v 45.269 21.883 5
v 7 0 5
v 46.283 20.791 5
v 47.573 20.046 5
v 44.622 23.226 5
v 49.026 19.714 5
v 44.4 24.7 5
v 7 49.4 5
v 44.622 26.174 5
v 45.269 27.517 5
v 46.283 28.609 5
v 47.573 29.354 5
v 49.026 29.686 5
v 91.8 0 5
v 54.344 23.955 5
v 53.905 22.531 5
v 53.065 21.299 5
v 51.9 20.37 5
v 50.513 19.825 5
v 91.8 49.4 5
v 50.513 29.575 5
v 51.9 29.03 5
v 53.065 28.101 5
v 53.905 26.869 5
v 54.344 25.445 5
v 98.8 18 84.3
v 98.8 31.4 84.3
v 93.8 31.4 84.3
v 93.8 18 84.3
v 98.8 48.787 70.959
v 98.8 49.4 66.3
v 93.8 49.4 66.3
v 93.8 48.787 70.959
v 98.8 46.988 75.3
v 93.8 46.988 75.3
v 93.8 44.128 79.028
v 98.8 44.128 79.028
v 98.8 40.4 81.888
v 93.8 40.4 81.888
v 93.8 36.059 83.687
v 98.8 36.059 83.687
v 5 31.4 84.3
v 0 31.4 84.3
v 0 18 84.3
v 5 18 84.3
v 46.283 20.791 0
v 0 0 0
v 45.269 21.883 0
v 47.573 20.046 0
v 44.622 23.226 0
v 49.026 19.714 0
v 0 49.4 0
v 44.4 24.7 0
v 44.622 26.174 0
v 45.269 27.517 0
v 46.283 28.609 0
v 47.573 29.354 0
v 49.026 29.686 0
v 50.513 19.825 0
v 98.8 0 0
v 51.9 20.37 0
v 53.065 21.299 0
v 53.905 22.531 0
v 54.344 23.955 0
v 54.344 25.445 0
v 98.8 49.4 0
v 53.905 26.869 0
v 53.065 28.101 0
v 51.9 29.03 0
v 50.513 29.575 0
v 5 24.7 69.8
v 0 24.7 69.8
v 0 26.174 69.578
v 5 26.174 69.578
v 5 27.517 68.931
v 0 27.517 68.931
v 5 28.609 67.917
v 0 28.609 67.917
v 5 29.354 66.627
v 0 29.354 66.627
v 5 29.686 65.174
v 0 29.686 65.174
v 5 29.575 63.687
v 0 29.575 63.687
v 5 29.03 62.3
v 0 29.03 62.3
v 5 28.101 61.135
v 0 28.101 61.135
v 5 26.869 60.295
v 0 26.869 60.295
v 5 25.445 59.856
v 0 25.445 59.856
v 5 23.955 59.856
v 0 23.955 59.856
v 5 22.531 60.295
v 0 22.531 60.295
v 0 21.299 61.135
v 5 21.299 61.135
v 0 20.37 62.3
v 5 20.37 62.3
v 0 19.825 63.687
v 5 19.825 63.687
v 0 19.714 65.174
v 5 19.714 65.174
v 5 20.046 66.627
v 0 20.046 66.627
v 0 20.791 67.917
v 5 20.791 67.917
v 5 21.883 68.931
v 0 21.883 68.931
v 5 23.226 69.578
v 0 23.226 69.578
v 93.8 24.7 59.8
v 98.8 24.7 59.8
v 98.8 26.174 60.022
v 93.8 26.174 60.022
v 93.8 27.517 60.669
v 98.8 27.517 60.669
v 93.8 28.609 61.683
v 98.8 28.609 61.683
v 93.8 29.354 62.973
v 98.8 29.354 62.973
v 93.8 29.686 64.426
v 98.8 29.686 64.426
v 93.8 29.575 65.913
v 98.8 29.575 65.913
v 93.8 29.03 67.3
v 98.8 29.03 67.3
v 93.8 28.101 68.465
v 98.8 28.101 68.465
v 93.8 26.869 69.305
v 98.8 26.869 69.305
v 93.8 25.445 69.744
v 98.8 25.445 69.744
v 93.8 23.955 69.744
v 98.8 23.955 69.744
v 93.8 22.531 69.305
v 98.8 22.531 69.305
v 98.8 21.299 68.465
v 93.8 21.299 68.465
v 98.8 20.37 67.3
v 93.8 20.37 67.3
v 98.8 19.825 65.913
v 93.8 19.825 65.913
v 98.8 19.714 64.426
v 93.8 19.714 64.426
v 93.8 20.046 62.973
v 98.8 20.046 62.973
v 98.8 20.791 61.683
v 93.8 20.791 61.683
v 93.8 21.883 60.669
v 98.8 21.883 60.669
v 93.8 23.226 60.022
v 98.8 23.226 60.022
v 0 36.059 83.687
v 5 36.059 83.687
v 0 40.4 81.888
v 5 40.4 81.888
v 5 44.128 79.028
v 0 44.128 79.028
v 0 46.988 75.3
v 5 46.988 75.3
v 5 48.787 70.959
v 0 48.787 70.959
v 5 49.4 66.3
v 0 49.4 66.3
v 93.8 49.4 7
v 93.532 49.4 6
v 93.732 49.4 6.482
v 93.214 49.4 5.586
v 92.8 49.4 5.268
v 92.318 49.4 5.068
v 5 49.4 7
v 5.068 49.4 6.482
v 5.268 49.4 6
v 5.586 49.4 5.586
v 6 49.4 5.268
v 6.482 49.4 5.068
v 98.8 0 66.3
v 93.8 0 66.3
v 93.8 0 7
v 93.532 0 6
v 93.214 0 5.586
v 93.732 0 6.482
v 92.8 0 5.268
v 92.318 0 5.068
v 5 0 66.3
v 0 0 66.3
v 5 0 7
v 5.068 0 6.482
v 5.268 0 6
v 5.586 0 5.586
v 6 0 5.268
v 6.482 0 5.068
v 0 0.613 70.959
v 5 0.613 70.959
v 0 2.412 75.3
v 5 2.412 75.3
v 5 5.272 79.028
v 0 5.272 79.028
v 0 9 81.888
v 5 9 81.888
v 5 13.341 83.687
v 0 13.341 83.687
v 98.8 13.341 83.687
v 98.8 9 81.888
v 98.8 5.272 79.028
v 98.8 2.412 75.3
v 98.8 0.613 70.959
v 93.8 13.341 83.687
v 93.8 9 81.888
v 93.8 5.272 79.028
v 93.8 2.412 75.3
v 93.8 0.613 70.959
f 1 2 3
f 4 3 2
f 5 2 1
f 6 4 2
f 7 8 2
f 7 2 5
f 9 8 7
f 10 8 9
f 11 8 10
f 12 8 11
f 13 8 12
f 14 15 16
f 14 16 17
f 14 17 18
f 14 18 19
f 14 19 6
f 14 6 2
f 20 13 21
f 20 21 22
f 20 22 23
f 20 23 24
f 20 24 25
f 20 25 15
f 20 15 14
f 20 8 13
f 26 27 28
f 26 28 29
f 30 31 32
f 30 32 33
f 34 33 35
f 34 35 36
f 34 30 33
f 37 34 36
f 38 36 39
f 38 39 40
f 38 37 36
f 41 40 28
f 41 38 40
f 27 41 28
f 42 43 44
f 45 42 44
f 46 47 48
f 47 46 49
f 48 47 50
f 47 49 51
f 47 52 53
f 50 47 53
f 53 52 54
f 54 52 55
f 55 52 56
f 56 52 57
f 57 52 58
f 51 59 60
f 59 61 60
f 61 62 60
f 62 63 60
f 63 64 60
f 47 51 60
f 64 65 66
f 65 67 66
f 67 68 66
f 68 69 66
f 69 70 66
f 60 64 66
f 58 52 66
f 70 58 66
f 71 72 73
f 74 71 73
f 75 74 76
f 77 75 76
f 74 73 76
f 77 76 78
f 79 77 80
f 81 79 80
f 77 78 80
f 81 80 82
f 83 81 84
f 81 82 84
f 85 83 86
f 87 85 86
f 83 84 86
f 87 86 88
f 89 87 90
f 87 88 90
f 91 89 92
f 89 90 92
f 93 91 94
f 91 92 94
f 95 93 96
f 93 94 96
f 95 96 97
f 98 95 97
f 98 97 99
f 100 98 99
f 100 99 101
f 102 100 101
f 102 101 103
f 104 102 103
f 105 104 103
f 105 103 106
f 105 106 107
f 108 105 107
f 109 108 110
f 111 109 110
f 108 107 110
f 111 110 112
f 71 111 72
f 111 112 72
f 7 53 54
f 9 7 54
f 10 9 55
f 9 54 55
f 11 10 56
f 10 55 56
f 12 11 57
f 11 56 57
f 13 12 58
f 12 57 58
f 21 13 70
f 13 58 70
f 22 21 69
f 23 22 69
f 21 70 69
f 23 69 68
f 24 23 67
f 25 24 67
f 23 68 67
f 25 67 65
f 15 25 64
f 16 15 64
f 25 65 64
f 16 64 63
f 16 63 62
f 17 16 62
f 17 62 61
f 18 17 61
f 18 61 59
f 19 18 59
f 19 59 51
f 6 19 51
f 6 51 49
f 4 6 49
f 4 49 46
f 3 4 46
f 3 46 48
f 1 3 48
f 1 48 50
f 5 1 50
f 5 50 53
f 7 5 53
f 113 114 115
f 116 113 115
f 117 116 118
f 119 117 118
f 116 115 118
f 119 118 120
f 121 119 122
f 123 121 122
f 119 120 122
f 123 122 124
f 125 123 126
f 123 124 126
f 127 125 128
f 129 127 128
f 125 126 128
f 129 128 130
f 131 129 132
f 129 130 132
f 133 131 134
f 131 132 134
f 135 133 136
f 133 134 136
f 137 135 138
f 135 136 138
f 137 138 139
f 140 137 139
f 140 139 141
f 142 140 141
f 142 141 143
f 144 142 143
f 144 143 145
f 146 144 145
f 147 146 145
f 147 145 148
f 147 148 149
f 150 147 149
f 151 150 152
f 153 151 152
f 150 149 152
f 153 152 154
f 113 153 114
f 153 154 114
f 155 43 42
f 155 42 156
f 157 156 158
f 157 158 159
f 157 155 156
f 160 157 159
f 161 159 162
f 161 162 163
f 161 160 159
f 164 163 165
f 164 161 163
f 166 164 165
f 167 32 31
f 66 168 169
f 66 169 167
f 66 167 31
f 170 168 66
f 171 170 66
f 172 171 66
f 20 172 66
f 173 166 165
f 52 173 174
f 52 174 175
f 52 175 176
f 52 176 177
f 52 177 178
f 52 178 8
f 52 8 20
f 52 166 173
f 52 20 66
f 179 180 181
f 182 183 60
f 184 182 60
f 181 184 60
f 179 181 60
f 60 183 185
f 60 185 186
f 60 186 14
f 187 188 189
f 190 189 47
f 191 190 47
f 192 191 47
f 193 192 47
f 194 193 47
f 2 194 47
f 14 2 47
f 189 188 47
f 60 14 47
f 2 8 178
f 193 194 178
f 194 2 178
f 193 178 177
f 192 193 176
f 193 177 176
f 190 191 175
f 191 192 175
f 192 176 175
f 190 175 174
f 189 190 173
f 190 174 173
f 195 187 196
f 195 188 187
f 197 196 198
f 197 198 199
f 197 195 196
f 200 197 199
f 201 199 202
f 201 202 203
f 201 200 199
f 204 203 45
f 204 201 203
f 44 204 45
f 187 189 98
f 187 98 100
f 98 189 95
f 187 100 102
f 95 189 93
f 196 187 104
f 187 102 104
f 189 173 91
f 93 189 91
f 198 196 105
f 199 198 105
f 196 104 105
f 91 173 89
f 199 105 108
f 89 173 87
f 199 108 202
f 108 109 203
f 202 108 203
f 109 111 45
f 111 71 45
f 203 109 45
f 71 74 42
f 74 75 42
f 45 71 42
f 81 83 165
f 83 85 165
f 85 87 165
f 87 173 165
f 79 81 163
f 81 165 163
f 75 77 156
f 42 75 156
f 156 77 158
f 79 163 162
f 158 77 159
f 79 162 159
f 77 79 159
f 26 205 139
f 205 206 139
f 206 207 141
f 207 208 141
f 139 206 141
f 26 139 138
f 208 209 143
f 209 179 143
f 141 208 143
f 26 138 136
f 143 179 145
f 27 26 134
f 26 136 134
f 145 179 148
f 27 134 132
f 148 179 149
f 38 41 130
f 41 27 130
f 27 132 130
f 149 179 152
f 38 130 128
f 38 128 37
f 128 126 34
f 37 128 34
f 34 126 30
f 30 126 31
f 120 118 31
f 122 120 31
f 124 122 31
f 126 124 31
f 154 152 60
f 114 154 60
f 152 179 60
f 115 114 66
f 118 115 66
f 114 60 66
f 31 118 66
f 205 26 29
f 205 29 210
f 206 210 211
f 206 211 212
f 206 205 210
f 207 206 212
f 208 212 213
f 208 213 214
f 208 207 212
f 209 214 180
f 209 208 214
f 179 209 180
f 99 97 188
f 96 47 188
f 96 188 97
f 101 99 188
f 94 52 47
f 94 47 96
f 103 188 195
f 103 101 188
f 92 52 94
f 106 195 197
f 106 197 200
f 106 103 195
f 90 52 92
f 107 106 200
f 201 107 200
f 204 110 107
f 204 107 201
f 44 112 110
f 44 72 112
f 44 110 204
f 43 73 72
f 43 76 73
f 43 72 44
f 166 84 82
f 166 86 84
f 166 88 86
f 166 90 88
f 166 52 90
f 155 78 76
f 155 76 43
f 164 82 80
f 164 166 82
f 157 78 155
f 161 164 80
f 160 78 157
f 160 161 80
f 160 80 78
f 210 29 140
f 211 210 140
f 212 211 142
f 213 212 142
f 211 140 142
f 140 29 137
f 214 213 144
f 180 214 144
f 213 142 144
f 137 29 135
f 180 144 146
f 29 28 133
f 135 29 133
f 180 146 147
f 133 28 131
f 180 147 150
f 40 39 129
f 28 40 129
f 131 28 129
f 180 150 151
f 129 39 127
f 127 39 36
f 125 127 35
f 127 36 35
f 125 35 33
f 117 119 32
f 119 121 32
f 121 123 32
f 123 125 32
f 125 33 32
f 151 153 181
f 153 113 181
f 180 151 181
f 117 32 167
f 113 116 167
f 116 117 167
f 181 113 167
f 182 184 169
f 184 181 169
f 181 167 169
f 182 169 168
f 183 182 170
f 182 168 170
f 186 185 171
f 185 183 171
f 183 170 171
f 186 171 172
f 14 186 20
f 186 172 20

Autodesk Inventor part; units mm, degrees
ref_plane "YZ Plane" through (0, 0, 0) normal (1, 0, 0) x (0, 1, 0)
ref_plane "XZ Plane" through (0, 0, 0) normal (0, 1, 0) x (-1, 0, 0)
ref_plane "XY Plane" through (0, 0, 0) normal (0, 0, 1) x (1, 0, 0)
sketch "Esquisse1" plane through (0, 0, 0) normal (0, 0, 1) x (1, 0, 0)
  line L0 (0, 0) -> (98.8, 0)
  line L1 (98.8, 0) -> (98.8, 49.4)
  line L2 (98.8, 49.4) -> (0, 49.4)
  line L3 (0, 49.4) -> (0, 0)
  dimension "d0" = 98.8
  dimension "d1" = 49.4
extrude "Extrusion1" add sketch "Esquisse1" along normal blind 5
sketch "Esquisse2" plane through (98.8, 0, 0) normal (1, 0, 0) x (0, 0, -1)
  line L0 (0, 49.4) -> (-5, 49.4) projected
  line L1 (-5, 49.4) -> (-66.3, 49.4)
  line L2 (-84.3, 31.4) -> (-84.3, 18)
  line L3 (-66.3, 0) -> (-5, 0)
  line L4 (-5, 0) -> (-5, 49.4)
  arc A0 (-66.3, 49.4) -> (-84.3, 31.4) centre (-66.3, 31.4) ccw
  arc A1 (-84.3, 18) -> (-66.3, 0) centre (-66.3, 18) ccw
  point P0 (0, 0)
  point P1 (-84.3, 49.4)
  dimension "d4" = 79.3
  dimension "d5" = 49.4
  dimension "d6" = 18
  dimension "d7" = 18
extrude "Extrusion2" add sketch "Esquisse2" against normal blind 5
sketch "Esquisse3" plane through (0, 0, 0) normal (-1, 0, 0) x (0, 0, 1)
  line L0 (66.3, 49.4) -> (5, 49.4) projected
  line L1 (5, 49.4) -> (66.3, 49.4)
  line L2 (84.3, 31.4) -> (84.3, 18)
  line L3 (66.3, 0) -> (5, 0)
  line L4 (5, 0) -> (5, 49.4)
  arc A0 (66.3, 0) -> (84.3, 18) centre (66.3, 18) ccw
  arc A1 (84.3, 31.4) -> (66.3, 49.4) centre (66.3, 31.4) ccw
  point P0 (0, 0)
  point P1 (84.3, 0)
  dimension "d13" = 79.3
  dimension "d14" = 49.4
  dimension "d15" = 18
extrude "Extrusion3" add sketch "Esquisse3" against normal blind 5
sketch "Esquisse4" plane through (0, 0, 0) normal (-1, 0, 0) x (0, 0, 1)
  circle A0 centre (64.8, 24.7) radius 5
  line L0 (84.3, 31.4) -> (84.3, 18) projected
  line L1 (0, 0) -> (66.3, 0) projected
  dimension "d18" = 10
  dimension "d19" = 19.5
  dimension "d20" = 24.7
extrude "Extrusion4" cut sketch "Esquisse4" against normal blind 5
sketch "Esquisse5" plane through (98.8, 0, 0) normal (1, 0, 0) x (0, 0, -1)
  circle A0 centre (-64.8, 24.7) radius 5
  line L0 (0, 49.4) -> (-66.3, 49.4) projected
  line L1 (-84.3, 31.4) -> (-84.3, 18) projected
  point P0 (0, 0)
  dimension "d23" = 10
  dimension "d24" = 24.7
  dimension "d25" = 19.5
extrude "Extrusion5" cut sketch "Esquisse5" against normal blind 5
sketch "Esquisse6" plane through (0, 0, 0) normal (0, 0, -1) x (-1, 0, 0)
  line L0 (-98.8, 49.4) -> (0, 49.4) projected
  line L1 (0, 0) -> (-98.8, 49.4)
  line L2 (-98.8, 0) -> (-98.8, 49.4) projected
  line L3 (-98.8, 0) -> (0, 49.4)
  circle A0 centre (-49.4, 24.7) radius 5
  dimension "d28" = 10
extrude "Extrusion6" cut sketch "Esquisse6" against normal blind 5 contours A0 L3 L1 | L1 L3 A0 | A0 L1 L3 | L1 A0 L3
fillet "Congé1" radius 2 2 edges at (93.8, 24.7, 5) (5, 24.7, 5)
properties part number "ShoulderPart2" material "Plastique ABS"
